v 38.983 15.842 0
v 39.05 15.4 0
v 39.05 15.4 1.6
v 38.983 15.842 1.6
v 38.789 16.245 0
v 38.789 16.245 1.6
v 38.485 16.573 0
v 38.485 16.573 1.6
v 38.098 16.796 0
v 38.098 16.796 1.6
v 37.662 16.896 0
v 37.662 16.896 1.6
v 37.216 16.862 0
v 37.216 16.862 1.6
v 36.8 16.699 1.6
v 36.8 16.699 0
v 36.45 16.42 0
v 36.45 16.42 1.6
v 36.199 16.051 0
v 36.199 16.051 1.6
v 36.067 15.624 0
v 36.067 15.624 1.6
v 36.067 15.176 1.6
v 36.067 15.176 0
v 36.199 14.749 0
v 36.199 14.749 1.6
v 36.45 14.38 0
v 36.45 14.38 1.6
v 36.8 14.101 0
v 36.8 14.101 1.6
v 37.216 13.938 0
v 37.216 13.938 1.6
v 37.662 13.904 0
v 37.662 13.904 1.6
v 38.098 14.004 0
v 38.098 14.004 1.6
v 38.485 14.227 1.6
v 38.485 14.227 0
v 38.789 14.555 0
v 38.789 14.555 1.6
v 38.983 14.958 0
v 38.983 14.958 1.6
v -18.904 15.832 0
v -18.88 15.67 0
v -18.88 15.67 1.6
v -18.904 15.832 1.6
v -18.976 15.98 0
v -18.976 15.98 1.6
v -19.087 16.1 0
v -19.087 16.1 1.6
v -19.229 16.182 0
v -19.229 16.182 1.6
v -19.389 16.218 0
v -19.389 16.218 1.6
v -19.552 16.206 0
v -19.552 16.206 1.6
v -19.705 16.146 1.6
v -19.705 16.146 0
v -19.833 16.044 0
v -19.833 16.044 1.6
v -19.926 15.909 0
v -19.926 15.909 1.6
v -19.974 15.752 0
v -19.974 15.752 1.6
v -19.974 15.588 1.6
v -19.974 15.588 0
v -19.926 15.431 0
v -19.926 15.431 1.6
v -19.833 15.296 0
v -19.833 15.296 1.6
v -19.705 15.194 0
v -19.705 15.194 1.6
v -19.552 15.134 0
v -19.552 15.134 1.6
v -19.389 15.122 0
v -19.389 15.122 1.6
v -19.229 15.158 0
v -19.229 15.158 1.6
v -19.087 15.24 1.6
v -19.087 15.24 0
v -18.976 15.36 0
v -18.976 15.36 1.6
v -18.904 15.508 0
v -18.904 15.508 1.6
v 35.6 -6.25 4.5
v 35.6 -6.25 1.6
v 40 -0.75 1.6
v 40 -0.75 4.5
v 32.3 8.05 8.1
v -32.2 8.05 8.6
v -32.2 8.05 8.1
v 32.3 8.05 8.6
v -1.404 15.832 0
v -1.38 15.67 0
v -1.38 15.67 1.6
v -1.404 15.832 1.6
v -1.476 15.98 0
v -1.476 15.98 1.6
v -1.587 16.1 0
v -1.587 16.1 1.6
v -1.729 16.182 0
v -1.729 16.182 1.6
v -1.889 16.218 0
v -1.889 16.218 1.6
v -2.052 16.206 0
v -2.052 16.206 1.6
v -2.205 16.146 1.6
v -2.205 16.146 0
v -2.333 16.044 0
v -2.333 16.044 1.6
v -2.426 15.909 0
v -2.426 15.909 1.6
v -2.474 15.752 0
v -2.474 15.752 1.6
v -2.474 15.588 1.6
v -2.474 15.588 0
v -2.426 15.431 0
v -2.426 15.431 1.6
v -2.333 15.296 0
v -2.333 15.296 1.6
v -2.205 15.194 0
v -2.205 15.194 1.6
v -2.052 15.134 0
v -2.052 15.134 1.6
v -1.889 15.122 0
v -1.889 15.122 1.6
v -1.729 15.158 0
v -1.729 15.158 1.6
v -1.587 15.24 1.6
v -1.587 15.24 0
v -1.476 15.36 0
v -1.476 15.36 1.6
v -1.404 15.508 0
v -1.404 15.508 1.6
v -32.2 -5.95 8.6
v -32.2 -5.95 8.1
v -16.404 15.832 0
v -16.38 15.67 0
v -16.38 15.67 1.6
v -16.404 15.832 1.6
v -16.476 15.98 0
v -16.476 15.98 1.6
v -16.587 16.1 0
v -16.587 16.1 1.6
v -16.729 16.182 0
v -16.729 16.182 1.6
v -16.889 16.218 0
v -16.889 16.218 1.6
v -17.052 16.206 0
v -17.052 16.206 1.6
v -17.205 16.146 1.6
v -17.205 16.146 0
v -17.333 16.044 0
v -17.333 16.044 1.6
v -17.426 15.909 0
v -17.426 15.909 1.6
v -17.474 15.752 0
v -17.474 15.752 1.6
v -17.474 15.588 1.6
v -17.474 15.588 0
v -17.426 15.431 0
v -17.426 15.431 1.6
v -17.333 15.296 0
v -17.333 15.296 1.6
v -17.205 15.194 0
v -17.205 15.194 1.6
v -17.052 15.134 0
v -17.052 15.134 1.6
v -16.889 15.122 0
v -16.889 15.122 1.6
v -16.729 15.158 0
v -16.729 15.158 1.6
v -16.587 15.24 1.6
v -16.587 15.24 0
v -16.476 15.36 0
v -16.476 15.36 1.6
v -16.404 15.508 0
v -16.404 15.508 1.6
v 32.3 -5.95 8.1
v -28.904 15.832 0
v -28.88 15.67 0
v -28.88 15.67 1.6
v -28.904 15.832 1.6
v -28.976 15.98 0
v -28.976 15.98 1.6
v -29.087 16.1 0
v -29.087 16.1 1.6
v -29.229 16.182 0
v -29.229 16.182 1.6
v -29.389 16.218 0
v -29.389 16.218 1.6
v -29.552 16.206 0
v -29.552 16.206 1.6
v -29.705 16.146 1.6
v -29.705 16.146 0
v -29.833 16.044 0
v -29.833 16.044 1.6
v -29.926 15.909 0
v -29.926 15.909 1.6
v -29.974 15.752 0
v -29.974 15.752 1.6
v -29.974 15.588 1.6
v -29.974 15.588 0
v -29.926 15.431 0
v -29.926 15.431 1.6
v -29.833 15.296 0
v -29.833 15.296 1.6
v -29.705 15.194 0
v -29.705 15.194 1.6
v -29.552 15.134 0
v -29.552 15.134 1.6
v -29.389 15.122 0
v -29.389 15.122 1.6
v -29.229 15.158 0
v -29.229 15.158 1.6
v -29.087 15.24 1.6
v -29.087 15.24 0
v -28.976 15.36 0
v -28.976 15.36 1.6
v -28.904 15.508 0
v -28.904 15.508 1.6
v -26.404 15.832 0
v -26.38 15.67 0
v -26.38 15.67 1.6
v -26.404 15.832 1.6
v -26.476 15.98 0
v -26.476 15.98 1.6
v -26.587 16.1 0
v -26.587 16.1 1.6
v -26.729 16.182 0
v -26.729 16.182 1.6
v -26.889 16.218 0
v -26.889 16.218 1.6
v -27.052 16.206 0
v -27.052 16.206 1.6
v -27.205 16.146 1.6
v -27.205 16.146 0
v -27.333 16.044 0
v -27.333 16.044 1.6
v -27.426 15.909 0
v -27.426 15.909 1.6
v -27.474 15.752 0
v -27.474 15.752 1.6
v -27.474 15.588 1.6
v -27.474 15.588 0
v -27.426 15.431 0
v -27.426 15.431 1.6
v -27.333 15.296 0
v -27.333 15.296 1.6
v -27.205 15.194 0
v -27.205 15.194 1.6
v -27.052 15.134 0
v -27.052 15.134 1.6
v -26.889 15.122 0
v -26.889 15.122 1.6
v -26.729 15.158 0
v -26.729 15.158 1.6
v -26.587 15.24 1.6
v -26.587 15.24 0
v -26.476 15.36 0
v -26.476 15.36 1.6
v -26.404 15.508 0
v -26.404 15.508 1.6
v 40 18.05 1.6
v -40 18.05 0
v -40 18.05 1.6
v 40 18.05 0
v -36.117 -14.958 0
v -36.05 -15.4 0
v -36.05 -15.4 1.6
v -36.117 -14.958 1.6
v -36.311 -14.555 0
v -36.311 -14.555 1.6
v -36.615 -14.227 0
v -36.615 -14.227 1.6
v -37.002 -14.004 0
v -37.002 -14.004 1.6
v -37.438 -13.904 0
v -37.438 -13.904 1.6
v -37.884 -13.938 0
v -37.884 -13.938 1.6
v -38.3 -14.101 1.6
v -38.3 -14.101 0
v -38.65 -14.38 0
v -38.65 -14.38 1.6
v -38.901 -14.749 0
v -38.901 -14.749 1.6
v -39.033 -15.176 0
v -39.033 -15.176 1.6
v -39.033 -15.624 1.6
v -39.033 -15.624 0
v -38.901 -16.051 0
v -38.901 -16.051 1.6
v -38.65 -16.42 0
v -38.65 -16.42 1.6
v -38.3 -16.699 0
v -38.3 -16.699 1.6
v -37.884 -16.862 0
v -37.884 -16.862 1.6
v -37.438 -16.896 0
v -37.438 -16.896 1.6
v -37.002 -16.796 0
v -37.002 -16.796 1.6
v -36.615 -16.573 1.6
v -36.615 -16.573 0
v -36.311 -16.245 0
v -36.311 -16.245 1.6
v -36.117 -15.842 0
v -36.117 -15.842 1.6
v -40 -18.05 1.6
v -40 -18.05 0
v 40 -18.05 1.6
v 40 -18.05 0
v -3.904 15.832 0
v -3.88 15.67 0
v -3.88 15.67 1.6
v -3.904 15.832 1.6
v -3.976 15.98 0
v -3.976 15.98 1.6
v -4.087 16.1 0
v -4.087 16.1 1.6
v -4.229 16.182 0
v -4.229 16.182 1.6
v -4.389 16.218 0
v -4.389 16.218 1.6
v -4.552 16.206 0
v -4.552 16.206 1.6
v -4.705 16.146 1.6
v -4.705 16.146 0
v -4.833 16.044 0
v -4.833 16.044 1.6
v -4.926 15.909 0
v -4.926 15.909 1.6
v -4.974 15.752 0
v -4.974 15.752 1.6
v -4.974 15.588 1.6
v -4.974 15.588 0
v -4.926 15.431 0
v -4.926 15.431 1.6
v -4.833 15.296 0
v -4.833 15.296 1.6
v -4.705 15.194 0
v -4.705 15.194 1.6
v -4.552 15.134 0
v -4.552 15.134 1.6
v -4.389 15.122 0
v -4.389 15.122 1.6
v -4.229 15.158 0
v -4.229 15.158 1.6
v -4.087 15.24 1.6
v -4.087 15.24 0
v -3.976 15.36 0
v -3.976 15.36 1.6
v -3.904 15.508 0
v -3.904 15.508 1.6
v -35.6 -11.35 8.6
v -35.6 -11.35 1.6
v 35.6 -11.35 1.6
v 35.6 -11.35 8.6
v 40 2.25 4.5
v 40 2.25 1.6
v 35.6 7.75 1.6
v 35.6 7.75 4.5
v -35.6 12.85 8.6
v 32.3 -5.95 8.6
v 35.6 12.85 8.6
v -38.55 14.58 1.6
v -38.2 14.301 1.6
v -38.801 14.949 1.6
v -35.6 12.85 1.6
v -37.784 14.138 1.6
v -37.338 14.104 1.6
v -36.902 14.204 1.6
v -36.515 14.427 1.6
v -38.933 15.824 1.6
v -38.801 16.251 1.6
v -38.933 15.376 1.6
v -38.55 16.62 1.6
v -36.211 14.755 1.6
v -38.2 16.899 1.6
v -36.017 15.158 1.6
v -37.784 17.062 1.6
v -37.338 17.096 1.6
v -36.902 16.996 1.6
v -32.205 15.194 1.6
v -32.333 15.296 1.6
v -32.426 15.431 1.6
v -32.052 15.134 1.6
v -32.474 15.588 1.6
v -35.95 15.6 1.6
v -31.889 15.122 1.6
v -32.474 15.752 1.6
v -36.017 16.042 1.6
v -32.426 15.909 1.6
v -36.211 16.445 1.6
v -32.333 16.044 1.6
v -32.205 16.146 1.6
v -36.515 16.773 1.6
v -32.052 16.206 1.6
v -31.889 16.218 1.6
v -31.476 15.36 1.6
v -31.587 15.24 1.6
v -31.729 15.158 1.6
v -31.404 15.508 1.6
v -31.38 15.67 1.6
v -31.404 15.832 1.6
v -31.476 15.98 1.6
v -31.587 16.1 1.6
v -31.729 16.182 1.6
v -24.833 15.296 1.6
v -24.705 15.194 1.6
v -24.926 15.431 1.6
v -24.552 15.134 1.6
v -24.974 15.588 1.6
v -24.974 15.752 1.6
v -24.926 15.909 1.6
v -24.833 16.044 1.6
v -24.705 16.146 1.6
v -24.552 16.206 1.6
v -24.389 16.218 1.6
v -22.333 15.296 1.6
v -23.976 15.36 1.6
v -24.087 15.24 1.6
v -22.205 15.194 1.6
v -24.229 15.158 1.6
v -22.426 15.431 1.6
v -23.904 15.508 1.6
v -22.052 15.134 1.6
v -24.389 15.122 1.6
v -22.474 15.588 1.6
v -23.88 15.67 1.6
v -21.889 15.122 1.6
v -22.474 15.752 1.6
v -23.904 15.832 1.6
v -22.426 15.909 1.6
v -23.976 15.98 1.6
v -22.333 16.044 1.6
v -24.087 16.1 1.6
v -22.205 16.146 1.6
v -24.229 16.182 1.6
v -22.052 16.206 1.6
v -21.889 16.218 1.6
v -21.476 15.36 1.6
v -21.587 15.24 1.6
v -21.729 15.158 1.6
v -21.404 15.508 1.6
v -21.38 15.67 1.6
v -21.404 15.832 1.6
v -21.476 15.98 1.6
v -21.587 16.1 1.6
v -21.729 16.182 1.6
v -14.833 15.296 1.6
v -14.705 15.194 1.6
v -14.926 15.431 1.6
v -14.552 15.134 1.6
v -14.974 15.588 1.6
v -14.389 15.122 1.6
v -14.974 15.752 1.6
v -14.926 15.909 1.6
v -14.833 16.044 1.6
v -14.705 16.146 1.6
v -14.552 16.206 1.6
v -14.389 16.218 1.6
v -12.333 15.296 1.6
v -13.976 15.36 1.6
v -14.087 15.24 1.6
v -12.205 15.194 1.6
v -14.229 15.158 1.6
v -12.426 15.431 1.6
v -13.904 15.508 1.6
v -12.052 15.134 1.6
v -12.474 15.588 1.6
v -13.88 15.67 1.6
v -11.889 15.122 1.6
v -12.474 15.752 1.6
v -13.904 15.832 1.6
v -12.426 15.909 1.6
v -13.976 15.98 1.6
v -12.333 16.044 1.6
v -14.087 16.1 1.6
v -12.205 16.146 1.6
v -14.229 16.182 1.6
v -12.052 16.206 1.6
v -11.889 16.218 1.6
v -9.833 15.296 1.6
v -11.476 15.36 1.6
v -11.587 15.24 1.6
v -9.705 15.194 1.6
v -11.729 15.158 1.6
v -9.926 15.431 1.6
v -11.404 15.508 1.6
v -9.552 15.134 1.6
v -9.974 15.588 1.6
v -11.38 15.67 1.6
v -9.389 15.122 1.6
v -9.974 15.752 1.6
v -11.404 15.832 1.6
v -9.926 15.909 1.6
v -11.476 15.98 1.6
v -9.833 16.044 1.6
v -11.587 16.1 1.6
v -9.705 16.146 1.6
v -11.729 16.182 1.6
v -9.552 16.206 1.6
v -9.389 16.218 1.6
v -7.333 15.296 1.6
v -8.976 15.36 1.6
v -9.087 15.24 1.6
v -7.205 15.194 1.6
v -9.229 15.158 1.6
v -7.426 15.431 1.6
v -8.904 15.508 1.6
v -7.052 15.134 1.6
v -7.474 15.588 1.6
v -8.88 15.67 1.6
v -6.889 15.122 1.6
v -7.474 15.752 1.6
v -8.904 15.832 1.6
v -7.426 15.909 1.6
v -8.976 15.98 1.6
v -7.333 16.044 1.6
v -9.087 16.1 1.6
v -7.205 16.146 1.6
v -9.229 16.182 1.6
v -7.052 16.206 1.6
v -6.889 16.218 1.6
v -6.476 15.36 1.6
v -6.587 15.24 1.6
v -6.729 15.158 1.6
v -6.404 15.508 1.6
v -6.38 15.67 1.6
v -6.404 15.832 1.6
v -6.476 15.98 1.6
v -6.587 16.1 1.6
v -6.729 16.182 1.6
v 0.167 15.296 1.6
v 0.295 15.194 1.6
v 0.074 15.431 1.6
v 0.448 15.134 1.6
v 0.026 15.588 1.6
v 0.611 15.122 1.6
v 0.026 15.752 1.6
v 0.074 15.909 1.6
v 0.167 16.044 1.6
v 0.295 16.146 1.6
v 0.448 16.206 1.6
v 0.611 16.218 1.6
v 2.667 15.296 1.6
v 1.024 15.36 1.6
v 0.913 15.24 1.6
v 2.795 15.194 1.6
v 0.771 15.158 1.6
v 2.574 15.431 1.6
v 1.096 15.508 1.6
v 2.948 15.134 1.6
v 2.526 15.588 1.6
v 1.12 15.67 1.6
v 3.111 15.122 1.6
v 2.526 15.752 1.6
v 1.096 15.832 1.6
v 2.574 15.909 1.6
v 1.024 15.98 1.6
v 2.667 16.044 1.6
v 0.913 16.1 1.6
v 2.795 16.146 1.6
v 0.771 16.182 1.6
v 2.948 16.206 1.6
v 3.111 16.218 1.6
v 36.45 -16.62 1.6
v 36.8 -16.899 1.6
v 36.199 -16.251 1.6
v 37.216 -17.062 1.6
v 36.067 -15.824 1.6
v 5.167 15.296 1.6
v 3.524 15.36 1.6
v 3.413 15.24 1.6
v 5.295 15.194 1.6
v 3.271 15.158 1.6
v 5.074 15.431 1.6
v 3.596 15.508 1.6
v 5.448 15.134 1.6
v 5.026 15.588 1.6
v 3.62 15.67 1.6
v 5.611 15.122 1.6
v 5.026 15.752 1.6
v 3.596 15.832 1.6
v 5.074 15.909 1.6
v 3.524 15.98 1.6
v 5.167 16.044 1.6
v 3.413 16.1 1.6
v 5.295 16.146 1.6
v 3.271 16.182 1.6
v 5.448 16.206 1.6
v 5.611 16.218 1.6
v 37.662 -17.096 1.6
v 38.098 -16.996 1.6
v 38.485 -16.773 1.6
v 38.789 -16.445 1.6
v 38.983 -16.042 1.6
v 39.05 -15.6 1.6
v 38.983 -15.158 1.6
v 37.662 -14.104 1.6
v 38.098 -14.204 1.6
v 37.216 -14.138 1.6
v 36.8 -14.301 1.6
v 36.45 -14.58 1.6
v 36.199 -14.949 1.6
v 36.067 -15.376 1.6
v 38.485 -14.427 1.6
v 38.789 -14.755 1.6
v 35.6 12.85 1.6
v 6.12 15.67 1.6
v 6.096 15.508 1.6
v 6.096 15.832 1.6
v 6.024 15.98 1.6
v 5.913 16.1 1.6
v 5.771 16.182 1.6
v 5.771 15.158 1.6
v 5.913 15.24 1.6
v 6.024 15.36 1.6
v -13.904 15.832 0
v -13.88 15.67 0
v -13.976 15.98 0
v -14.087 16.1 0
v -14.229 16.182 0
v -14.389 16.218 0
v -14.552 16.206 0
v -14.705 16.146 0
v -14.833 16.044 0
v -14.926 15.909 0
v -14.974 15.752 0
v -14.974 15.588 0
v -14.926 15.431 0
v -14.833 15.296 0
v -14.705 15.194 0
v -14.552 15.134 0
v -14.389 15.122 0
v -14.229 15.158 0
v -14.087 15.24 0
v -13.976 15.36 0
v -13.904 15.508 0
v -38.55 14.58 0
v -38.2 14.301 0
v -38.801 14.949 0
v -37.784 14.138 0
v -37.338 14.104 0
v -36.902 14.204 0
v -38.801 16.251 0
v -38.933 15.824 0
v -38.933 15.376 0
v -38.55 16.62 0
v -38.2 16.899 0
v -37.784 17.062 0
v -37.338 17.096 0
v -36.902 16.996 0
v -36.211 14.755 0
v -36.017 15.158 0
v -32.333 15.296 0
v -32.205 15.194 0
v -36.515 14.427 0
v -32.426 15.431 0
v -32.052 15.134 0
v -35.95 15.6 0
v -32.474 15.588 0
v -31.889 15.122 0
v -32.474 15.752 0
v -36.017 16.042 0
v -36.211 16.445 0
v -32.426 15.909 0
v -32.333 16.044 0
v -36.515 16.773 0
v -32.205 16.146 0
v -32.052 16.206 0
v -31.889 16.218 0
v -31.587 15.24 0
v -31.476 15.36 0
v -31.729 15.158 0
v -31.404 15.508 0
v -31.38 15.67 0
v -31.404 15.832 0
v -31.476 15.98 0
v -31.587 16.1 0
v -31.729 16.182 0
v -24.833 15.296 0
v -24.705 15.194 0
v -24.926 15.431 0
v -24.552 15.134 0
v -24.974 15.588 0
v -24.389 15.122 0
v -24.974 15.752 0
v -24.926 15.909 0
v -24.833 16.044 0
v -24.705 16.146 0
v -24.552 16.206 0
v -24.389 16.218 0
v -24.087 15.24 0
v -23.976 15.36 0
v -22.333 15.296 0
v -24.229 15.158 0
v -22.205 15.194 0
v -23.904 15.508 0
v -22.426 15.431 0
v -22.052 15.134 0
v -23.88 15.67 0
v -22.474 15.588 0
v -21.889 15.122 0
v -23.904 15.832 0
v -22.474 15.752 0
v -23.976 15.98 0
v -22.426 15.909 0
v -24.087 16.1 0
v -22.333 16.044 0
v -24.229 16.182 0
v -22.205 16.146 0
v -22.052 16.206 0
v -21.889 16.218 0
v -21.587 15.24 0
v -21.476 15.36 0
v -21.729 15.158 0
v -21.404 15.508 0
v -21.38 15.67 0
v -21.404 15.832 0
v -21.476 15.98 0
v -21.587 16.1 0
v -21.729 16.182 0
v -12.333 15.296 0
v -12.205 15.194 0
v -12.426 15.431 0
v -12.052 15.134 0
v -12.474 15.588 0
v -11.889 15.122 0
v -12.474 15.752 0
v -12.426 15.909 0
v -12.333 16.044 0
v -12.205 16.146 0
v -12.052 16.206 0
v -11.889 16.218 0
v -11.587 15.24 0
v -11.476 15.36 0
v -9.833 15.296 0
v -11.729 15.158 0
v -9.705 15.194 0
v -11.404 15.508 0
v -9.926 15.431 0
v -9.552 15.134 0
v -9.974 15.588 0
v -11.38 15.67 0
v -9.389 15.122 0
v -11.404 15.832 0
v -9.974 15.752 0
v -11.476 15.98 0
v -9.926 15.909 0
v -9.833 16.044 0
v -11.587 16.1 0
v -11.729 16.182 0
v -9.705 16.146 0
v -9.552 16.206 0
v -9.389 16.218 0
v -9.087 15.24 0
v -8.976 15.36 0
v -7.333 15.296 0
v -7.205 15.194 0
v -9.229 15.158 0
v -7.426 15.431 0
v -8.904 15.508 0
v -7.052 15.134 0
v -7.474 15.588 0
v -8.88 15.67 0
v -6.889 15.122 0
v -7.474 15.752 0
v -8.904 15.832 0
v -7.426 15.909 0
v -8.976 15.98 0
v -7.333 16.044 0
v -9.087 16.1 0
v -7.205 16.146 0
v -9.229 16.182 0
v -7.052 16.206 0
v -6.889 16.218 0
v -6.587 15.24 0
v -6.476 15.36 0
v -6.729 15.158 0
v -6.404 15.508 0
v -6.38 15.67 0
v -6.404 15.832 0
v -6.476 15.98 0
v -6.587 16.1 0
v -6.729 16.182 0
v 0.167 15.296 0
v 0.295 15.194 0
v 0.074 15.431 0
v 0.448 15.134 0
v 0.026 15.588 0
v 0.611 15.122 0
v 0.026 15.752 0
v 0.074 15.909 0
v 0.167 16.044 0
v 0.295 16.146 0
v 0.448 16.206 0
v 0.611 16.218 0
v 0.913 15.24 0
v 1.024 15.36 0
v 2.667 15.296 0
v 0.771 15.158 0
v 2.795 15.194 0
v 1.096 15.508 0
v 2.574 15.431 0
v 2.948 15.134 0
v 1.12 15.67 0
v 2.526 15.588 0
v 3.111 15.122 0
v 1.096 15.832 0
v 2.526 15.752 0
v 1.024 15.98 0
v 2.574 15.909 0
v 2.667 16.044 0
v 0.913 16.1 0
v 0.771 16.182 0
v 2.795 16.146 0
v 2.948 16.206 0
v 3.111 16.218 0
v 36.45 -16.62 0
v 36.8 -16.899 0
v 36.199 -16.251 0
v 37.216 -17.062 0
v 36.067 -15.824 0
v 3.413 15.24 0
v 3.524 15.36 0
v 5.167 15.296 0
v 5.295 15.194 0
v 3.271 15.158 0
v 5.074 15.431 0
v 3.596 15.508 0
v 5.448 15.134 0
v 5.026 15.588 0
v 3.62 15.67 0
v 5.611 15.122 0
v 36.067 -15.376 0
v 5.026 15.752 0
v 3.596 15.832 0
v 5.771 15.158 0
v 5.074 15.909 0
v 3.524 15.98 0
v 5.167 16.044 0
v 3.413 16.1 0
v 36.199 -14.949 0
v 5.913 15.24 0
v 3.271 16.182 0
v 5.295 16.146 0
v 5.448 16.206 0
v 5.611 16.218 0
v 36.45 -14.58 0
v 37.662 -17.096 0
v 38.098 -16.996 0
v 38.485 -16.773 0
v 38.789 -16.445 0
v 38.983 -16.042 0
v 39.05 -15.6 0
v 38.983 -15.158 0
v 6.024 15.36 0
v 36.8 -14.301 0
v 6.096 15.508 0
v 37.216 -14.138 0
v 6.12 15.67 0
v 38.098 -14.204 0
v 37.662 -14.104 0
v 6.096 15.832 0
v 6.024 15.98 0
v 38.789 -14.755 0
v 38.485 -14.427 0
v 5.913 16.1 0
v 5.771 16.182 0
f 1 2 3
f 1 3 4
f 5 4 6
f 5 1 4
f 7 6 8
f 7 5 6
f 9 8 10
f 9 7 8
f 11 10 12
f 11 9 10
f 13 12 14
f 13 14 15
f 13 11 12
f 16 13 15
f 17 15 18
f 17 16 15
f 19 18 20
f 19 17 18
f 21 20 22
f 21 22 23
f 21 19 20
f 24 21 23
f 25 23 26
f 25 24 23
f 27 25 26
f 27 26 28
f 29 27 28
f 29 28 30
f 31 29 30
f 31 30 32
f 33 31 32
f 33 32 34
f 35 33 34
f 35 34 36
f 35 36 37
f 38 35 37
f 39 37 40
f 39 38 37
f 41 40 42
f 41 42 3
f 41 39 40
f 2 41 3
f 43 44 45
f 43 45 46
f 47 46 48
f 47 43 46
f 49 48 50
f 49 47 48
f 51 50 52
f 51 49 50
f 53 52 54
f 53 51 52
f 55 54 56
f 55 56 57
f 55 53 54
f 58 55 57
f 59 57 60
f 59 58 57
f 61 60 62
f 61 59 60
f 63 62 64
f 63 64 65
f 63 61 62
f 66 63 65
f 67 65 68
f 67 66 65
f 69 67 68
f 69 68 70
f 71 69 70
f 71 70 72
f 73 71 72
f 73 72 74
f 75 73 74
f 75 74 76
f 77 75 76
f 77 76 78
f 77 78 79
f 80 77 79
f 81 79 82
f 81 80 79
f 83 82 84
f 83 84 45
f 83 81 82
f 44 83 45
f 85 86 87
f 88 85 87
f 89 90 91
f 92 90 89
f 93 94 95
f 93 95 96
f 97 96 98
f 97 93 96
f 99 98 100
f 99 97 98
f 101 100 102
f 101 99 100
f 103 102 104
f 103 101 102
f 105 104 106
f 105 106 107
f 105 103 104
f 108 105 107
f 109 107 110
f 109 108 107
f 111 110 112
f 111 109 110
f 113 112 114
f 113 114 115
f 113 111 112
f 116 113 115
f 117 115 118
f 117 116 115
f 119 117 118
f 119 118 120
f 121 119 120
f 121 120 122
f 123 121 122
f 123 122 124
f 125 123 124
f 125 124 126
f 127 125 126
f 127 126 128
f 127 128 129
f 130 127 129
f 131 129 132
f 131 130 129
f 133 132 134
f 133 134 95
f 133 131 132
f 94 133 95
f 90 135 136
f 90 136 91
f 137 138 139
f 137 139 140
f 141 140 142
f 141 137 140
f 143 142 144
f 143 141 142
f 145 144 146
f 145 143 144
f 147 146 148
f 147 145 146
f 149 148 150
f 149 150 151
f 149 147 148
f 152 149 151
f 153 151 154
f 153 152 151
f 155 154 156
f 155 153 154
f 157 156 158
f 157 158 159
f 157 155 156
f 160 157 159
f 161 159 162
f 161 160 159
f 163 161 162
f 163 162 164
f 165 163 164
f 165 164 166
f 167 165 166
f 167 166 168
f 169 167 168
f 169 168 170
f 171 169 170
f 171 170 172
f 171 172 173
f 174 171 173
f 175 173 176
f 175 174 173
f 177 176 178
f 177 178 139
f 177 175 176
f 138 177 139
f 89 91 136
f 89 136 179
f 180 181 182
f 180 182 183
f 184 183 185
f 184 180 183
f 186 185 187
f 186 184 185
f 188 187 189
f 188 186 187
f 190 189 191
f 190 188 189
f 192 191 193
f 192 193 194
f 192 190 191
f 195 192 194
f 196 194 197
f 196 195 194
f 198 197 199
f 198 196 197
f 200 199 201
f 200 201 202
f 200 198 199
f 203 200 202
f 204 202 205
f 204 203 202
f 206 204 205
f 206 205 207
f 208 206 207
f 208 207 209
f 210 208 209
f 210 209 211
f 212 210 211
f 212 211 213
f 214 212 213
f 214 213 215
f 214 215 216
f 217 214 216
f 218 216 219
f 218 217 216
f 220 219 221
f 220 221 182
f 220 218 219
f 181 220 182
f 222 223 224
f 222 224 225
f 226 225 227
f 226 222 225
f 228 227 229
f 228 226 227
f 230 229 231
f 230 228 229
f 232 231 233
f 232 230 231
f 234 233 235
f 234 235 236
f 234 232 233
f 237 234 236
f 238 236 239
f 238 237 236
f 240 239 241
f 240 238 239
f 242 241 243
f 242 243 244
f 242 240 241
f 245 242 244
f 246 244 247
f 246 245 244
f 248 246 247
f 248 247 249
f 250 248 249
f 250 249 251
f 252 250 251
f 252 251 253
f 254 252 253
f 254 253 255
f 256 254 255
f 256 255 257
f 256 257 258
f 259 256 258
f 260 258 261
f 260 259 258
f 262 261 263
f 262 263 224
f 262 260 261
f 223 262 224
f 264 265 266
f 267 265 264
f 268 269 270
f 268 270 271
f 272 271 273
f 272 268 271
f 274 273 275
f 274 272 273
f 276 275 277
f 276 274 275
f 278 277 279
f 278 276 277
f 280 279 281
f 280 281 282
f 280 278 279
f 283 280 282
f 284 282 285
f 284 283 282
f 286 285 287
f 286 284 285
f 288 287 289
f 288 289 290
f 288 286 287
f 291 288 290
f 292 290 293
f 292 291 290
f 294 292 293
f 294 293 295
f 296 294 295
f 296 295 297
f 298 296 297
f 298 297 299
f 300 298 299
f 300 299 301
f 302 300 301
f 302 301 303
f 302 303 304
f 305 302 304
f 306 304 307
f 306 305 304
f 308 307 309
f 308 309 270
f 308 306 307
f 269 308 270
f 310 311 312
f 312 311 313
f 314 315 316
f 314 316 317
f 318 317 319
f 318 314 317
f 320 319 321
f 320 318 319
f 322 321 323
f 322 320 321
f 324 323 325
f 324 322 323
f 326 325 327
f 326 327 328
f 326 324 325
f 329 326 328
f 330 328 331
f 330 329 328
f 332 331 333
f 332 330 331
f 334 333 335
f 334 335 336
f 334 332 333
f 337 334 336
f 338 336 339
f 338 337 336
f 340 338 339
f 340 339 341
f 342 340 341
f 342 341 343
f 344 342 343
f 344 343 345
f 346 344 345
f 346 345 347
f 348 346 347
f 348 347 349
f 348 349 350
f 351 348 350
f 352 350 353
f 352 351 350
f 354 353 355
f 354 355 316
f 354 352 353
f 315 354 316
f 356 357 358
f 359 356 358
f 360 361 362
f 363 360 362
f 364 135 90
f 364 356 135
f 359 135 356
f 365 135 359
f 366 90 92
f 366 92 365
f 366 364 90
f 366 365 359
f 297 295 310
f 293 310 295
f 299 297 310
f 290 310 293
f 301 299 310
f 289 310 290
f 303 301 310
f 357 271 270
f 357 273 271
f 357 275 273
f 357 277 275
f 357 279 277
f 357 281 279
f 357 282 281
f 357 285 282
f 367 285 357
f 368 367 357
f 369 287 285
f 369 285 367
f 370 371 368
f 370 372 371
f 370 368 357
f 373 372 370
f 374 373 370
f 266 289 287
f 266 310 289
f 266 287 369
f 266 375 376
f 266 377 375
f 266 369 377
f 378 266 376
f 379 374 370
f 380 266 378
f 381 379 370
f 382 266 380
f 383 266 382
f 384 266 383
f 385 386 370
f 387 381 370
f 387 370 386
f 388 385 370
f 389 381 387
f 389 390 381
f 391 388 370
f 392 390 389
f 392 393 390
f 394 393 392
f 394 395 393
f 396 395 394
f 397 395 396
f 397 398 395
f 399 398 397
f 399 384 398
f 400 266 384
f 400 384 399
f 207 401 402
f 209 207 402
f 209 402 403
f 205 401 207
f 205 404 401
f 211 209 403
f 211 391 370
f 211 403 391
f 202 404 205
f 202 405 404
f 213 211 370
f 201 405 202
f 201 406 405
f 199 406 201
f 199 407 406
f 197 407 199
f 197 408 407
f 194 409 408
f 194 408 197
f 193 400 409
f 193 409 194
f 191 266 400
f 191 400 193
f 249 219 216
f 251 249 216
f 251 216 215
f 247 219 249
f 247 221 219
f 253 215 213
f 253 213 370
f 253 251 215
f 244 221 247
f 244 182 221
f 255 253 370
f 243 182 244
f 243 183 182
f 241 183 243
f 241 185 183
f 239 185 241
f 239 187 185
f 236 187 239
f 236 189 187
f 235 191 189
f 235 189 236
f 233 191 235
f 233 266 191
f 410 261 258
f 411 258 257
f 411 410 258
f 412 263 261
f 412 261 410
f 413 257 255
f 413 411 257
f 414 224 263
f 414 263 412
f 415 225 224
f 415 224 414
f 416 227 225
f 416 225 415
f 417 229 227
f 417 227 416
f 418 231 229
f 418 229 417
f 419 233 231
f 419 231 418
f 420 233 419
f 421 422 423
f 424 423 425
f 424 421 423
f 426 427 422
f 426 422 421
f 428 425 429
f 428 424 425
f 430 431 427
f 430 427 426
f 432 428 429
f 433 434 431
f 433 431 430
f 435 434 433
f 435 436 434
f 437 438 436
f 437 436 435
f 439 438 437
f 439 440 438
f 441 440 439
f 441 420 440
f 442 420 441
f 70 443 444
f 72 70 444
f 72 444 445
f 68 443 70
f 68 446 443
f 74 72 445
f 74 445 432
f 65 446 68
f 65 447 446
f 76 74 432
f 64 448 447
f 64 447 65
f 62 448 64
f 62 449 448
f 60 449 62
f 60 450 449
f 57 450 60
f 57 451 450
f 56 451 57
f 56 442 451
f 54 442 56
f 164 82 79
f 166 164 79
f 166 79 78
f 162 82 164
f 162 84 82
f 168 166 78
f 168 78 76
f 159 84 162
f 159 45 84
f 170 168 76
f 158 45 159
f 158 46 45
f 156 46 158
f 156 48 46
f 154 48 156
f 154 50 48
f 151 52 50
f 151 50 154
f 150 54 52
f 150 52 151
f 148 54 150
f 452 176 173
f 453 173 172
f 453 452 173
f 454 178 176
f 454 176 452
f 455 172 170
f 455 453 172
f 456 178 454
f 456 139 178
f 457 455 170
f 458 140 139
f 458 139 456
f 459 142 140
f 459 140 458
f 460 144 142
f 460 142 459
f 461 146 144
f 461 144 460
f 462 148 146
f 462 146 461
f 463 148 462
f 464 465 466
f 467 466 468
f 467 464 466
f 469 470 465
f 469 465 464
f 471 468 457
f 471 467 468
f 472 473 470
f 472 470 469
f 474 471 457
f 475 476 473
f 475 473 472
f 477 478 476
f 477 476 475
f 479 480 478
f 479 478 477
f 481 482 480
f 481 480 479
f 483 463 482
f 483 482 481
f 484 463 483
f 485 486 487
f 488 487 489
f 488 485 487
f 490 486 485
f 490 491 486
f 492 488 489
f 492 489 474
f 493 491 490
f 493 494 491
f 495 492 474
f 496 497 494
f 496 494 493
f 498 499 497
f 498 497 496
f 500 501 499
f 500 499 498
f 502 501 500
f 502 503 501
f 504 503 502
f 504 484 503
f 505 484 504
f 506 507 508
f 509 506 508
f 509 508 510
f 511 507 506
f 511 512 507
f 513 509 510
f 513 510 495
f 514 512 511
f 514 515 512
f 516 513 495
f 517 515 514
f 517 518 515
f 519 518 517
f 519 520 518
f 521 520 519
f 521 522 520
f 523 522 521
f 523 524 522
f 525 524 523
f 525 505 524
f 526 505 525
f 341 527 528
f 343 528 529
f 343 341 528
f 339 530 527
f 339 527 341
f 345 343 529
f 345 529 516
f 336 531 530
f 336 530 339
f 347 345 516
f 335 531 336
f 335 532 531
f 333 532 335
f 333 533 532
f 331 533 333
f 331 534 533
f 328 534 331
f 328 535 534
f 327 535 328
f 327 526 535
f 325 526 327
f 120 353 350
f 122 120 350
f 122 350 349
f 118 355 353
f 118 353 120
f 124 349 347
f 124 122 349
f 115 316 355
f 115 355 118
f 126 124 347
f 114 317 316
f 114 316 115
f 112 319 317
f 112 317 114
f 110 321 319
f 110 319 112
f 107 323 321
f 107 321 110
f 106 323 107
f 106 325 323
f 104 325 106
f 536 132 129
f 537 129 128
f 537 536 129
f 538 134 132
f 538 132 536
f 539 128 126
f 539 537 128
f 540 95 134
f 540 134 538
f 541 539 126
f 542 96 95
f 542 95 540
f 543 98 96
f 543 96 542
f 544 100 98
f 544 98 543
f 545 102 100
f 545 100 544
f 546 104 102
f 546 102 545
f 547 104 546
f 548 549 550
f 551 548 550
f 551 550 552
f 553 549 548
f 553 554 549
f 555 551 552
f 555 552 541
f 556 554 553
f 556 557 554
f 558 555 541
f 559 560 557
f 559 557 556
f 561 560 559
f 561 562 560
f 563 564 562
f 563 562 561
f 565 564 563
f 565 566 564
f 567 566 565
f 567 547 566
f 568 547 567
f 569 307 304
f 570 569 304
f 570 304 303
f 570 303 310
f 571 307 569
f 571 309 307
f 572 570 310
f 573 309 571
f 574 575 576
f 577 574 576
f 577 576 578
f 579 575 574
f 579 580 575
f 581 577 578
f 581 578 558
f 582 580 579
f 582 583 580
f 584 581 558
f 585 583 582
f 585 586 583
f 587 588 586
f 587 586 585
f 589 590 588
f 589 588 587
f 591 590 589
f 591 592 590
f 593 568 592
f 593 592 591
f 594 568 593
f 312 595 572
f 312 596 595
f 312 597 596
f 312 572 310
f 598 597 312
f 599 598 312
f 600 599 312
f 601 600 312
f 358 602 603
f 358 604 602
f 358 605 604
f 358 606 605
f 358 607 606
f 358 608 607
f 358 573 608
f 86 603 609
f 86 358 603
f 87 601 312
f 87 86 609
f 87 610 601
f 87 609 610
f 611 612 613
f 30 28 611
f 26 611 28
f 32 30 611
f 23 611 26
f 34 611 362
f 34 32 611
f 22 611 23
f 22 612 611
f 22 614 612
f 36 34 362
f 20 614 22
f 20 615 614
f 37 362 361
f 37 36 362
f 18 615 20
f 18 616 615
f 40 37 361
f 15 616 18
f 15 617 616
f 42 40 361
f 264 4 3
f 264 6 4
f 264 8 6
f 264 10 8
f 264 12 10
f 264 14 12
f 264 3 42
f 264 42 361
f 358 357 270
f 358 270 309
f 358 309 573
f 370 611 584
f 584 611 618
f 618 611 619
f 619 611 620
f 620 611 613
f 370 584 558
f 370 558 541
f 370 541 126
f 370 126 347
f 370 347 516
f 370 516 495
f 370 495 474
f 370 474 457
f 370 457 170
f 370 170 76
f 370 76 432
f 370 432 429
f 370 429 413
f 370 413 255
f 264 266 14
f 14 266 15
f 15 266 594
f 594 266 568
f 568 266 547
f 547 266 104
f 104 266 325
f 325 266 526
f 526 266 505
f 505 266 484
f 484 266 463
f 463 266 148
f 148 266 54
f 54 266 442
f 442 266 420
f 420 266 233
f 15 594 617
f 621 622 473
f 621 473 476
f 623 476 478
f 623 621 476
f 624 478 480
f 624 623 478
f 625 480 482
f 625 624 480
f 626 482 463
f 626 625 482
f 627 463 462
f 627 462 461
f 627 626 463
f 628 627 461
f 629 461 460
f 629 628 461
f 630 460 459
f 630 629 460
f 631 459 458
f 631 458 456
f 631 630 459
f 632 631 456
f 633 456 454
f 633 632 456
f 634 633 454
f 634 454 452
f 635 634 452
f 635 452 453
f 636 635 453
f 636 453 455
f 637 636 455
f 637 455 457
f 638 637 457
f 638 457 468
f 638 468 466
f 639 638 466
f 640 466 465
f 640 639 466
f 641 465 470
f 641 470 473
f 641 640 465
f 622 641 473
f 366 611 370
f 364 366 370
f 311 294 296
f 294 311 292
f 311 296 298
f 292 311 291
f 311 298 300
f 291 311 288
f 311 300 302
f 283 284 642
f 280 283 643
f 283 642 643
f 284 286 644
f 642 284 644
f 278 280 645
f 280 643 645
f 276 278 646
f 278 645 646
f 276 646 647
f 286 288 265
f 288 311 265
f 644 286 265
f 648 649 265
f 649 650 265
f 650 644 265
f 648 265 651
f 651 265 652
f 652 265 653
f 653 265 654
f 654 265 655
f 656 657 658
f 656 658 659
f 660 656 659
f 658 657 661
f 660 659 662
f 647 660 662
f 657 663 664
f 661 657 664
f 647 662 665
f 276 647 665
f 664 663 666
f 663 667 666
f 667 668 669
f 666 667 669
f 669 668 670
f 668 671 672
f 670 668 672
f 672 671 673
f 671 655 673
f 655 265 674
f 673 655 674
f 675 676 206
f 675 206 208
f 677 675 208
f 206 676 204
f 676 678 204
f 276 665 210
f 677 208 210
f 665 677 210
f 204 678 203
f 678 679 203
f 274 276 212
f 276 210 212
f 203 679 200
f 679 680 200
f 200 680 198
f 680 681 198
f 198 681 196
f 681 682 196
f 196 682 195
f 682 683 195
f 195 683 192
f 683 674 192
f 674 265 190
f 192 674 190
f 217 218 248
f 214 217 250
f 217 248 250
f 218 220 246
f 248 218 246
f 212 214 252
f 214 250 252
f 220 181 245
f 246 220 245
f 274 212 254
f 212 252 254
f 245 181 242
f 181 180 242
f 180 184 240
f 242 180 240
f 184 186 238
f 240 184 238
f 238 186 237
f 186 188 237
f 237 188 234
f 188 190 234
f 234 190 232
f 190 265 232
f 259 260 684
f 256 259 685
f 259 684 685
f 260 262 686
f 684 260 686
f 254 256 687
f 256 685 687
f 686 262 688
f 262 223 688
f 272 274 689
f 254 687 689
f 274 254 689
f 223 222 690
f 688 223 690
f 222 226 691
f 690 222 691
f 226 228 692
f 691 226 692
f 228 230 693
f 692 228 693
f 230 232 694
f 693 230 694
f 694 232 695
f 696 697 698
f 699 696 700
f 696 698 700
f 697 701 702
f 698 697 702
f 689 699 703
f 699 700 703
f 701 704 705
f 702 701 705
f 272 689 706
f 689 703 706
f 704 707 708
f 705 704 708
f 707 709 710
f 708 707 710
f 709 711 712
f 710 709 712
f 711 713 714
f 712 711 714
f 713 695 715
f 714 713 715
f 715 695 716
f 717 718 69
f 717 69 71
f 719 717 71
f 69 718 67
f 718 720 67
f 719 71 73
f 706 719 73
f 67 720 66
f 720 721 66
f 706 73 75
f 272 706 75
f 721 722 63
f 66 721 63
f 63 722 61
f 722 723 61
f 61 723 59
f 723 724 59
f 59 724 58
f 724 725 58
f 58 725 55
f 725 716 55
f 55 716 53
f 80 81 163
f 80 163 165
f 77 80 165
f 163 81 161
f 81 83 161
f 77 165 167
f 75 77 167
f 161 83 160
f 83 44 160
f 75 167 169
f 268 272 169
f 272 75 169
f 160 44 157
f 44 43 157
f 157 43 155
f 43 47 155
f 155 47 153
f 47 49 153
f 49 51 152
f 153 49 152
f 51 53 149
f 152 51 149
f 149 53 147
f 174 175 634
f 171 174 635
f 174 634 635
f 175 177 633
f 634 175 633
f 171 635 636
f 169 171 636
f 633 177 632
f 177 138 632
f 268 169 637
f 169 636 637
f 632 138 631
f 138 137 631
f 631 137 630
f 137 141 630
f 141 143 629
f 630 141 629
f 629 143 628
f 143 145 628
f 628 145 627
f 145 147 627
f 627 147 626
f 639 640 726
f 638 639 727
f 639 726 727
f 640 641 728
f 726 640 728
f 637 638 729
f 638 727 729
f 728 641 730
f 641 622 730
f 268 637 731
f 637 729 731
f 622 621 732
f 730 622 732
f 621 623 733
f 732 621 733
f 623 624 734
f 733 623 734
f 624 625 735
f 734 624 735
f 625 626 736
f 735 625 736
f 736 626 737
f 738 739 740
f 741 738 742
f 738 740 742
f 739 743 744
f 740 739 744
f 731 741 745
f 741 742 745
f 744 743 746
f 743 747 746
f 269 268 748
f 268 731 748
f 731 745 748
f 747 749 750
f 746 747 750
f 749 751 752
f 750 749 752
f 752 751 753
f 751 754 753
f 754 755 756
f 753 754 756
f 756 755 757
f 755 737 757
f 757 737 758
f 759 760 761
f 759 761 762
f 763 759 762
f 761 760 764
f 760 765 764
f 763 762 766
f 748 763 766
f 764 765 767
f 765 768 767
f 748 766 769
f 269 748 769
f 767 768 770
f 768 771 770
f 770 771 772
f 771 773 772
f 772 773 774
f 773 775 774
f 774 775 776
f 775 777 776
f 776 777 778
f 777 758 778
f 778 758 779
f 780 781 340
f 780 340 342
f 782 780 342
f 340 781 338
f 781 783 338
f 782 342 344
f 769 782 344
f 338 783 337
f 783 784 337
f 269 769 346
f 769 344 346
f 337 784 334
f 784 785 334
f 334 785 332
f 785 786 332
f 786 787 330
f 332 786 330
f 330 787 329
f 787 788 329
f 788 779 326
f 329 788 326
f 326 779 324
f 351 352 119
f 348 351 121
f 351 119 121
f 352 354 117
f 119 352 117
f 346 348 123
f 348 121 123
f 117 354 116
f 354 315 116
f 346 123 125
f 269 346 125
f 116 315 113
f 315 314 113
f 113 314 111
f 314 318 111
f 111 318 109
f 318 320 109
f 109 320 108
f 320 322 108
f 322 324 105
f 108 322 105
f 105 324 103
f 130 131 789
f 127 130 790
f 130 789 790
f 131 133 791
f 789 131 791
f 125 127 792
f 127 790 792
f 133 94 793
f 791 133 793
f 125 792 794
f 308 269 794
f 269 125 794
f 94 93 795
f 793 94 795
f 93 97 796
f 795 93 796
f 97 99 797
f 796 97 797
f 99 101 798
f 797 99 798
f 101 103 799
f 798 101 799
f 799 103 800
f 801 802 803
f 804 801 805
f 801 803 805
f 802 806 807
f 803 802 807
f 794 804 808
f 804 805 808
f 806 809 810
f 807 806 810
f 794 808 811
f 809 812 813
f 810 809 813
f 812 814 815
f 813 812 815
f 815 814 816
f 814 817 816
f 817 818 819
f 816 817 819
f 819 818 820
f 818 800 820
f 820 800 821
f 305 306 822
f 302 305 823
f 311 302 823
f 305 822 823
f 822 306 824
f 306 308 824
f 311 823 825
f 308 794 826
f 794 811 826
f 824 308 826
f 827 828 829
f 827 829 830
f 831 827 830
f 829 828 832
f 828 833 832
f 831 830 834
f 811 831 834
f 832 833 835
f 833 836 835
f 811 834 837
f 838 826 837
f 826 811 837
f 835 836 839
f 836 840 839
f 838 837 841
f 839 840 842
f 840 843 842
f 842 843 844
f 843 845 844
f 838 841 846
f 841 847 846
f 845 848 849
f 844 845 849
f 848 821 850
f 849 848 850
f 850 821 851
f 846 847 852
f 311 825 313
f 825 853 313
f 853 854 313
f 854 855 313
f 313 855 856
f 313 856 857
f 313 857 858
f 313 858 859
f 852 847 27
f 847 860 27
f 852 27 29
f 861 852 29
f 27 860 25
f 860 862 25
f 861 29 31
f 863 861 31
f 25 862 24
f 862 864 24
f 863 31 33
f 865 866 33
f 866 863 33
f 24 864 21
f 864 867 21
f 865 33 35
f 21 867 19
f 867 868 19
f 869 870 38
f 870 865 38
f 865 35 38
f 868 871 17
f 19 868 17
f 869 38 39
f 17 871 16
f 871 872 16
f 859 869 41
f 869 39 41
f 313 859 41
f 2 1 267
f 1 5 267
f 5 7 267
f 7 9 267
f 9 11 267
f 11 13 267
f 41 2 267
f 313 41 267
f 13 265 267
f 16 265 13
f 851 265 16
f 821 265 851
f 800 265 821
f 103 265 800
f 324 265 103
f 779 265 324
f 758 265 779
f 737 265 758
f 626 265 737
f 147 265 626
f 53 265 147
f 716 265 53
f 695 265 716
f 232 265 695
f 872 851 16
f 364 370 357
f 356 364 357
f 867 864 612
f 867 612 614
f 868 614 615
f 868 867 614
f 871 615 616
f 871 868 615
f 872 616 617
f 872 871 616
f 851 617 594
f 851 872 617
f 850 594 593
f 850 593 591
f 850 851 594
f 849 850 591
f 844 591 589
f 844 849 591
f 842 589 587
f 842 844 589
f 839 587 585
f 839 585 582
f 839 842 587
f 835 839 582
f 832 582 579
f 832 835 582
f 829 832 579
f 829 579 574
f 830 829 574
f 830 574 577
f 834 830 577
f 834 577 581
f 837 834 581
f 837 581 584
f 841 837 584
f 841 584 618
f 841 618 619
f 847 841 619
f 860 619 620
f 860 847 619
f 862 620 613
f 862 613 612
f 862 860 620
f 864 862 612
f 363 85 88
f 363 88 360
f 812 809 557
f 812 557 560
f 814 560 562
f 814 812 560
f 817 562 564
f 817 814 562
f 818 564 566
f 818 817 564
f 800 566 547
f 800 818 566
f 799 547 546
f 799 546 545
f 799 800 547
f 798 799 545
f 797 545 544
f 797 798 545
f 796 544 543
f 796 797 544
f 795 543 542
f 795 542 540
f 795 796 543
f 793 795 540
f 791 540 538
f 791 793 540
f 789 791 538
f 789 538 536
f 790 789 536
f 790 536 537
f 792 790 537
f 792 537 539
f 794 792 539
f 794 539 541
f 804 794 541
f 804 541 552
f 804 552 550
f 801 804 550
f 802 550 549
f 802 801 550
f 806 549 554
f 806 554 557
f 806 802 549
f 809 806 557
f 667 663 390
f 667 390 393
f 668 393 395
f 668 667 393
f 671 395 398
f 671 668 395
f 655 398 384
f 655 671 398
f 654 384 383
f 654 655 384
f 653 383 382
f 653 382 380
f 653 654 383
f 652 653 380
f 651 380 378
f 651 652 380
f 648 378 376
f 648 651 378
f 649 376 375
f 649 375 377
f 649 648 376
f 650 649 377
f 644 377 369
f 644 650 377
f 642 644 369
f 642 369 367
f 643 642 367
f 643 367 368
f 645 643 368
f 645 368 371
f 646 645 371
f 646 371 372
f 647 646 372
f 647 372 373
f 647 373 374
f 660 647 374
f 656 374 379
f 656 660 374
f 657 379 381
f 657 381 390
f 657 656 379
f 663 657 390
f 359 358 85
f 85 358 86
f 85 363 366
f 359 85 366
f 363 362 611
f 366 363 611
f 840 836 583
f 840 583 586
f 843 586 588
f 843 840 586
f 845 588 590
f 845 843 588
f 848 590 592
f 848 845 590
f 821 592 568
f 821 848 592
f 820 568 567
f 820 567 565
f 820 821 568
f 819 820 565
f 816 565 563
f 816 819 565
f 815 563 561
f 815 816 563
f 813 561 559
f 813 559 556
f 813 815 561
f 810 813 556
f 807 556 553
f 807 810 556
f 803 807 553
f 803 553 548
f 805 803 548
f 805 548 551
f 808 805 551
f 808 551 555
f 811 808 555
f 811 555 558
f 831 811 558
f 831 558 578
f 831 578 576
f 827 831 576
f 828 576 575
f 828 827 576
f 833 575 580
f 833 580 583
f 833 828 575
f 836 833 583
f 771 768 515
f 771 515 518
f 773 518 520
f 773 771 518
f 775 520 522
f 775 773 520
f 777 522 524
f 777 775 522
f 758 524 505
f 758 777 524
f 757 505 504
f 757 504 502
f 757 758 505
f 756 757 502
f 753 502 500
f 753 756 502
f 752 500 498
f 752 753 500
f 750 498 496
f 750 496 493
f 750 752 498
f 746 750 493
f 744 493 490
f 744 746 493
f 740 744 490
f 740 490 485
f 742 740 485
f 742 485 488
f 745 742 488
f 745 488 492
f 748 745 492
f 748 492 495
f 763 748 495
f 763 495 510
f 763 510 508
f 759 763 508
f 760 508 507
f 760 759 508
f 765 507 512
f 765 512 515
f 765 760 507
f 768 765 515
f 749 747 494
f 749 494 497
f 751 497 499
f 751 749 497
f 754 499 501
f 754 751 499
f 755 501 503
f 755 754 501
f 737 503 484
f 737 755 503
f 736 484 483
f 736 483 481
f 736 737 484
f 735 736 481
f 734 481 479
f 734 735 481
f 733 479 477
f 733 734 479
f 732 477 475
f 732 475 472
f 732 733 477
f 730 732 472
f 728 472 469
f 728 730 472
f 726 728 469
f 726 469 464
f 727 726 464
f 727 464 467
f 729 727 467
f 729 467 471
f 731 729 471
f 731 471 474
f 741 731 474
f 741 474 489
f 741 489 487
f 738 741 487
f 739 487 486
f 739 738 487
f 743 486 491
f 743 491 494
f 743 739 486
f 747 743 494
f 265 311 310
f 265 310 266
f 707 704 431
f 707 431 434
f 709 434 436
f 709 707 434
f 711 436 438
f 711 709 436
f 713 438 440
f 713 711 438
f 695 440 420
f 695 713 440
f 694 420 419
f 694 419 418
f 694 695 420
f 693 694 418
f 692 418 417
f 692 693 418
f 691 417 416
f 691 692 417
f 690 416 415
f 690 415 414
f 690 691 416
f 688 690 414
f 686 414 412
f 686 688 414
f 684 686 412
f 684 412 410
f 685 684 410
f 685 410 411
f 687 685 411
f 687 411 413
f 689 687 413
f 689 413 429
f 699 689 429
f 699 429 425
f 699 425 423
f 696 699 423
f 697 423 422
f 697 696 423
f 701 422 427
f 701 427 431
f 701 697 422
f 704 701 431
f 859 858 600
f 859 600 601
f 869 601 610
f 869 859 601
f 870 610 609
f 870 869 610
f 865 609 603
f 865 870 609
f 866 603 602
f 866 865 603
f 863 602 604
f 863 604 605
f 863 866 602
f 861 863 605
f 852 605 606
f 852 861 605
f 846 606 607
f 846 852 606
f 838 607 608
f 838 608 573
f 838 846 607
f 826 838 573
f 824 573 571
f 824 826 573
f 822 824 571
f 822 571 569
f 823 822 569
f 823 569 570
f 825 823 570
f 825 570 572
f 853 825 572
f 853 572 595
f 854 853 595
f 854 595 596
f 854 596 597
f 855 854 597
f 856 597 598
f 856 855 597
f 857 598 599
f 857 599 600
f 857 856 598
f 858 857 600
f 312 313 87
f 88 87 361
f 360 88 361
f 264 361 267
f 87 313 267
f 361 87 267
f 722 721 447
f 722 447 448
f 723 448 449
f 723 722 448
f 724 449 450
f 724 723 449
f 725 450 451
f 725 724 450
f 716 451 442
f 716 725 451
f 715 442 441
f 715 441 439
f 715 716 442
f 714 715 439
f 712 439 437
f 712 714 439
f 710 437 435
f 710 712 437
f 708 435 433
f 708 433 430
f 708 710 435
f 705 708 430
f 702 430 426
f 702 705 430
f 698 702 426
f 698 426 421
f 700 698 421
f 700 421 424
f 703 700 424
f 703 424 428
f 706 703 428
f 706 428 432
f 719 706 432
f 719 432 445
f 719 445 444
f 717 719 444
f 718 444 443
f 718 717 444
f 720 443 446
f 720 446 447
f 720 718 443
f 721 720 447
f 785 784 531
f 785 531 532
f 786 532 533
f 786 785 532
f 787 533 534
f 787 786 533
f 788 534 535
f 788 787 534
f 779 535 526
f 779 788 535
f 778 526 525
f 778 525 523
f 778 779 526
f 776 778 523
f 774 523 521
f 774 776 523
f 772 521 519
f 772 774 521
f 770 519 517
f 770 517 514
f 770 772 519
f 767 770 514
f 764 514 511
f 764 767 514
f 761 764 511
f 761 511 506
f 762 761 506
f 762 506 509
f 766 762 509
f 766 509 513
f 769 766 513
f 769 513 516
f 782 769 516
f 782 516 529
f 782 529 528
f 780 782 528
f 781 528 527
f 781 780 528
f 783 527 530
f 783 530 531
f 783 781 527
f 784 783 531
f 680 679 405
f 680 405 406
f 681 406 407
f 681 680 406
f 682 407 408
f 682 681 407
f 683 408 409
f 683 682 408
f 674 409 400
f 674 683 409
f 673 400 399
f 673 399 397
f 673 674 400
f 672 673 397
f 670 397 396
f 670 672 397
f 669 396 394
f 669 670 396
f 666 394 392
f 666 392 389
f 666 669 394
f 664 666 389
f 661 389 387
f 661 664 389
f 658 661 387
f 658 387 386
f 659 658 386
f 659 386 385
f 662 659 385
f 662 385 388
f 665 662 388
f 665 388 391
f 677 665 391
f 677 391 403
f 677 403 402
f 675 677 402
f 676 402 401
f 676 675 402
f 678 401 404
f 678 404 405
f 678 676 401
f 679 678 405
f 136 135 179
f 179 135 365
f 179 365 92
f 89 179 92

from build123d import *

# Parameters (mm, degrees)
F0_W     = 80
F0_H     = 36.1
F0_R     = 1.5
F0_R_2   = 0.55
F1_DEPTH = 1.6
F3_DEPTH = 7
F4_DEPTH = 2.9
F5_W     = 64.5
F5_H     = 14
F6_DEPTH = 0.5


with BuildPart() as f1:
    # F0 (on Top) → F1 (new body)
    with BuildSketch(Plane.XY):
        Rectangle(F0_W, F0_H)
        with Locations((-37.55, -15.4)):
            Circle(F0_R, mode=Mode.SUBTRACT)
        with Locations((37.55, -15.6)):
            Circle(F0_R, mode=Mode.SUBTRACT)
        with Locations((-37.45, 15.6)):
            Circle(F0_R, mode=Mode.SUBTRACT)
        with Locations((-31.93, 15.67)):
            Circle(F0_R_2, mode=Mode.SUBTRACT)
        with Locations((-29.43, 15.67)):
            Circle(F0_R_2, mode=Mode.SUBTRACT)
        with Locations((-26.93, 15.67)):
            Circle(F0_R_2, mode=Mode.SUBTRACT)
        with Locations((-24.43, 15.67)):
            Circle(F0_R_2, mode=Mode.SUBTRACT)
        with Locations((-21.93, 15.67)):
            Circle(F0_R_2, mode=Mode.SUBTRACT)
        with Locations((-19.43, 15.67)):
            Circle(F0_R_2, mode=Mode.SUBTRACT)
        with Locations((-16.93, 15.67)):
            Circle(F0_R_2, mode=Mode.SUBTRACT)
        with Locations((-14.43, 15.67)):
            Circle(F0_R_2, mode=Mode.SUBTRACT)
        with Locations((-11.93, 15.67)):
            Circle(F0_R_2, mode=Mode.SUBTRACT)
        with Locations((-9.43, 15.67)):
            Circle(F0_R_2, mode=Mode.SUBTRACT)
        with Locations((-6.93, 15.67)):
            Circle(F0_R_2, mode=Mode.SUBTRACT)
        with Locations((-4.43, 15.67)):
            Circle(F0_R_2, mode=Mode.SUBTRACT)
        with Locations((-1.93, 15.67)):
            Circle(F0_R_2, mode=Mode.SUBTRACT)
        with Locations((0.57, 15.67)):
            Circle(F0_R_2, mode=Mode.SUBTRACT)
        with Locations((3.07, 15.67)):
            Circle(F0_R_2, mode=Mode.SUBTRACT)
        with Locations((5.57, 15.67)):
            Circle(F0_R_2, mode=Mode.SUBTRACT)
        with Locations((37.55, 15.4)):
            Circle(F0_R, mode=Mode.SUBTRACT)
    extrude(amount=F1_DEPTH)

    # F2 (on face) → F3 (join)
    with BuildSketch(Plane.XY.offset(1.6)):
        Polygon((-35.6, 12.85), (-35.6, -11.35), (35.6, -11.35), (35.6, -6.25), (35.6, 7.75), (35.6, 12.85), align=None)
    extrude(amount=F3_DEPTH)

    # F2 (on face) → F4 (join)
    with BuildSketch(Plane.XY.offset(1.6)):
        Polygon((-35.6, 12.85), (-35.6, -11.35), (35.6, -11.35), (35.6, -6.25), (35.6, 7.75), (35.6, 12.85), align=None)
        Polygon((35.6, 7.75), (35.6, -6.25), (40, -0.75), (40, 2.25), align=None)
    extrude(amount=F4_DEPTH)

    # F5 (on face) → F6 (cut)
    with BuildSketch(Plane.XY.offset(8.6)):
        with Locations((0.05, 1.05)):
            Rectangle(F5_W, F5_H)
    extrude(amount=-F6_DEPTH, mode=Mode.SUBTRACT)


solid = f1.part
